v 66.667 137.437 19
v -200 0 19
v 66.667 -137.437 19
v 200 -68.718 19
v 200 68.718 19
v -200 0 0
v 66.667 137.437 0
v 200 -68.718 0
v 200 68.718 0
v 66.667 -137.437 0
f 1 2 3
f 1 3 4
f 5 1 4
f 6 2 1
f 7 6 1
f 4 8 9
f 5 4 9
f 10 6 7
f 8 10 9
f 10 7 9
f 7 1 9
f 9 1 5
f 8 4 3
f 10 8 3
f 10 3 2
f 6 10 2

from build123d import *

# Parameters (mm, degrees)
F0_W     = 400
F0_H     = 350
F1_DEPTH = 19
F3_DEPTH = 19.001
F4_DEPTH = 19.001


with BuildPart() as f1:
    # F0 (on Top) → F1 (new body)
    with BuildSketch(Plane.XY):
        Rectangle(F0_W, F0_H)
    extrude(amount=F1_DEPTH)

    # F2 (on face) → F3 (cut, through all)
    with BuildSketch(Plane.XY.offset(19)):
        Polygon((66.666667, -137.436854), (-200, 0), (-200, -175), (200, -175), (200, -68.718427), align=None)
    extrude(amount=-F3_DEPTH, mode=Mode.SUBTRACT)

    # F2 (on face) → F4 (cut, through all)
    with BuildSketch(Plane.XY.offset(19)):
        Polygon((-200, 175), (-200, 0), (66.666667, 137.436854), (200, 68.718427), (200, 175), align=None)
    extrude(amount=-F4_DEPTH, mode=Mode.SUBTRACT)


solid = f1.part
